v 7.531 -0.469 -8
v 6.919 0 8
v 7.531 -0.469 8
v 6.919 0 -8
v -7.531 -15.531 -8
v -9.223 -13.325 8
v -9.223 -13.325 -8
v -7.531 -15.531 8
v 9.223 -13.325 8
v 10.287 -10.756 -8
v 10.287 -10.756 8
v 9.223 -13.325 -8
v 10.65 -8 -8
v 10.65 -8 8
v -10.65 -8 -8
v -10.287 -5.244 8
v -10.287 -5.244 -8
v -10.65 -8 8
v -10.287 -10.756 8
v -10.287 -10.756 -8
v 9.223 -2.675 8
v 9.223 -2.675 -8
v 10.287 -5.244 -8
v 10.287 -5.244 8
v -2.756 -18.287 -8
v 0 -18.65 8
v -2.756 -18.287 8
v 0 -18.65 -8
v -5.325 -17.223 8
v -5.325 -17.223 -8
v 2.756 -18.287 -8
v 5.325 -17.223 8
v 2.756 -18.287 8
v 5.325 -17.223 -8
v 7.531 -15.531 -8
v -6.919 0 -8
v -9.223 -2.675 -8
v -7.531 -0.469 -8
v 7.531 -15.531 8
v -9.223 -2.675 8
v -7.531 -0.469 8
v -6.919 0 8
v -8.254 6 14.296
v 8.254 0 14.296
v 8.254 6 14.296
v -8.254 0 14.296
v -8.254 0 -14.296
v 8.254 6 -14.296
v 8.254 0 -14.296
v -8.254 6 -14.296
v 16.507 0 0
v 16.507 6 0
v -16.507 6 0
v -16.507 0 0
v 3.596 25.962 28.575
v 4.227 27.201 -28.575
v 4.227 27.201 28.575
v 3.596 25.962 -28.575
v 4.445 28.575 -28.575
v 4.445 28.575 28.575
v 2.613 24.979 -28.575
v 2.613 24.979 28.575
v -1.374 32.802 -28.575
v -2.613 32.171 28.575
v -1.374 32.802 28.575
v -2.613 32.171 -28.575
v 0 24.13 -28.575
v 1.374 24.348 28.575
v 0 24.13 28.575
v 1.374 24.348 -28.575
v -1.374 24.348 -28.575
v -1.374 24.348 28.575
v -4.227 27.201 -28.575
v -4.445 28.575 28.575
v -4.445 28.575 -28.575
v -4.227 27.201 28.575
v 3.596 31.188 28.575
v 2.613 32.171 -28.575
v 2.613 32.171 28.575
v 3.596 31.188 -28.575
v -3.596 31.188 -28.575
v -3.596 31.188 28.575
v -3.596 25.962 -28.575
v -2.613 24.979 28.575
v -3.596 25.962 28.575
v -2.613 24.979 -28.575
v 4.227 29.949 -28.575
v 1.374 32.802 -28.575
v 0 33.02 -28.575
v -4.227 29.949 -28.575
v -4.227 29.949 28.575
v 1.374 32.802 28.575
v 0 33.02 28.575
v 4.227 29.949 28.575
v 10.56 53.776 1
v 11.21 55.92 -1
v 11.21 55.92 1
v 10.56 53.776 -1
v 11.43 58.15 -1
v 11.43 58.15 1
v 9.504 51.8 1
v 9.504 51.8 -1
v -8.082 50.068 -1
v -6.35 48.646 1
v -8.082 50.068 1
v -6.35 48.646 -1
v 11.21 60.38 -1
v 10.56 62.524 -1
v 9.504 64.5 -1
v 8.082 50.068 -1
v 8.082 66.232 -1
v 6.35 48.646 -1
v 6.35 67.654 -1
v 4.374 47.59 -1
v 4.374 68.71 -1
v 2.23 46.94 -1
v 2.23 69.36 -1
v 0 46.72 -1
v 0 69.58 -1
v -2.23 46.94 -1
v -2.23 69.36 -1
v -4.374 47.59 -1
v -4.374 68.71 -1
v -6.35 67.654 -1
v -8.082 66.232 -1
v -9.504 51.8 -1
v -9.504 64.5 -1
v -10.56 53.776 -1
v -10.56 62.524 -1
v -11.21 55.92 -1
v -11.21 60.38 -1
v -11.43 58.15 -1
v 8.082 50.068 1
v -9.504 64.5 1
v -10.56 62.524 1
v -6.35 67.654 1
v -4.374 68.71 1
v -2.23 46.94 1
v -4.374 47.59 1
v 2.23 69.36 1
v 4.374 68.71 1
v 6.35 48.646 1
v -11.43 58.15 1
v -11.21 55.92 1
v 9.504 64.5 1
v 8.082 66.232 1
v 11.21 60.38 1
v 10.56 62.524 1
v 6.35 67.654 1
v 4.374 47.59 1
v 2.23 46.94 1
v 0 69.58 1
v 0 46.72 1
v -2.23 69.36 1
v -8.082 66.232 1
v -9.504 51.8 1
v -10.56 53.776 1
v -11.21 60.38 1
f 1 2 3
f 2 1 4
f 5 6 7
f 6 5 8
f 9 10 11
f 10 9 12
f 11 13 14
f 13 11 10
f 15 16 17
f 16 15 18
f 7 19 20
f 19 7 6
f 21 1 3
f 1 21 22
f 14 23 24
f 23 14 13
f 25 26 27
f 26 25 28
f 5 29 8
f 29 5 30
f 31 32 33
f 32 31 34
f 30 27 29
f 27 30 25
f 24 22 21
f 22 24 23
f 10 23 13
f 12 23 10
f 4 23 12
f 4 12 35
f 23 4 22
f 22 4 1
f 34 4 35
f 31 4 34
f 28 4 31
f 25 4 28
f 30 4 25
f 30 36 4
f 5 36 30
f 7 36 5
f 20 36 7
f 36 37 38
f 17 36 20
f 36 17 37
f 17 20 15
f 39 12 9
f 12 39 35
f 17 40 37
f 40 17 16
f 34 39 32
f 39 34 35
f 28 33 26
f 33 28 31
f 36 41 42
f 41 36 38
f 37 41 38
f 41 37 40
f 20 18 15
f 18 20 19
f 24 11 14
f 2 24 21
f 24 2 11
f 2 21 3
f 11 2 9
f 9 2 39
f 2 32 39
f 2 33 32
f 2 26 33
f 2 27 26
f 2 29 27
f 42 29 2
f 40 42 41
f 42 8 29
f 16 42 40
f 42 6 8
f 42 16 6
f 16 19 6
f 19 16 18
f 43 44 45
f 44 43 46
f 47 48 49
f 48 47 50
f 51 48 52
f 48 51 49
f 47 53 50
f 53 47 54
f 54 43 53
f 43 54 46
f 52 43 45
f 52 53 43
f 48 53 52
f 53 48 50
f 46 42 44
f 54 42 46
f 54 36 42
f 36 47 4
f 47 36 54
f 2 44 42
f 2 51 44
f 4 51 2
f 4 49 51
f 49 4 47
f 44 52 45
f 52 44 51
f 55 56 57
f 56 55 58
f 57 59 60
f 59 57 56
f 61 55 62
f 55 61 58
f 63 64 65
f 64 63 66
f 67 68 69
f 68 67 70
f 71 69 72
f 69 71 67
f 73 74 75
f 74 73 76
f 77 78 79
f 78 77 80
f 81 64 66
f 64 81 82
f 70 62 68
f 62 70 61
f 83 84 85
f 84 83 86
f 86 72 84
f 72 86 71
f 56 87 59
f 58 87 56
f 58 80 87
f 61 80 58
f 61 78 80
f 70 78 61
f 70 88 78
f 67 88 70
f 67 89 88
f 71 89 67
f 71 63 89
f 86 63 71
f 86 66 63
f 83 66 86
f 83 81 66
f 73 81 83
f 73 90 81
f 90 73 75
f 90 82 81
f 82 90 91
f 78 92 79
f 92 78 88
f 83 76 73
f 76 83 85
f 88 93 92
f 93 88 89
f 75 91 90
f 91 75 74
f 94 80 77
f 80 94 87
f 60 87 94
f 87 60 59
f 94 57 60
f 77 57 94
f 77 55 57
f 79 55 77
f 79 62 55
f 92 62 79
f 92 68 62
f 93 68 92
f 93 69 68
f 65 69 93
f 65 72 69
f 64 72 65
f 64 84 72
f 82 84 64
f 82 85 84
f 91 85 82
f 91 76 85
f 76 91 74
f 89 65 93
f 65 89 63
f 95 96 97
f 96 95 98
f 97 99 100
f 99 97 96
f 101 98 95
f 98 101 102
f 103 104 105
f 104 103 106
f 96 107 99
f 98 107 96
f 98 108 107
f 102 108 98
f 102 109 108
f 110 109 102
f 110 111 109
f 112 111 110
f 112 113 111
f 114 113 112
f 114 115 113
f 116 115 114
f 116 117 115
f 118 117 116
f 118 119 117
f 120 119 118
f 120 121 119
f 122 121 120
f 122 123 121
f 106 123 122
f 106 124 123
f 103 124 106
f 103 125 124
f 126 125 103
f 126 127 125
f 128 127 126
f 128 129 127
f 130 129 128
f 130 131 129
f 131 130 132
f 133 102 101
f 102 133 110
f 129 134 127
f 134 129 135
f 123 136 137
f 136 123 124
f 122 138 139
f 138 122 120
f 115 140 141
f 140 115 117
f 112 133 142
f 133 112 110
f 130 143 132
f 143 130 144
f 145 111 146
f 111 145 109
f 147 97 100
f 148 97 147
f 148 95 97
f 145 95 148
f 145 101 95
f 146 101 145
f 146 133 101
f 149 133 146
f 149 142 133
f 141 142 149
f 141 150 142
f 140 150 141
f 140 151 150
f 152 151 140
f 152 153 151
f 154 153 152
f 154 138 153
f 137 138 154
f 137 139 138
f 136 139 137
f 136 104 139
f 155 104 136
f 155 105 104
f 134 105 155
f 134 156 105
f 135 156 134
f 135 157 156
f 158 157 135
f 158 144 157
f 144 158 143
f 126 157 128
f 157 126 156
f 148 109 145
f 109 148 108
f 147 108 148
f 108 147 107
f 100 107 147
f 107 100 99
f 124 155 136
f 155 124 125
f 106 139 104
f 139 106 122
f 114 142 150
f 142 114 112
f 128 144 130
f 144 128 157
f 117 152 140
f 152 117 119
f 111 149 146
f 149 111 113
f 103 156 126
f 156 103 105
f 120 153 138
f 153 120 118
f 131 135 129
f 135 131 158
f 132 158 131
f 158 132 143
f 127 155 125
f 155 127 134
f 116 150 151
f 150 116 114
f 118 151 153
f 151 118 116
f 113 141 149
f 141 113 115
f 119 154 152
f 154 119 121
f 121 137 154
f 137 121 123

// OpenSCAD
// Auto-generated by scripts/author_from_manifest.py (Phase D.3).
// Source: data/phase_d_manifest.json (sku_intent='tyco-ty3151-upright-175f').
// Do not hand-edit — regenerate from the manifest.
//
// @part tyco_ty3151_upright_175f
// @kind sprinkler_head
// @category head.upright.k56
// @display-name "Tyco TY3151 Upright K5.6 SR 175°F"
// @mfg tyco_fire_protection
// @mfg-pn TY3151
// @listing UL FM
// @hazard-classes LH OH1
// @price-usd 13.80
// @install-minutes 8
// @crew journeyman
// @k-factor 5.6
// @orientation upright
// @response standard
// @temperature 175F
// @param size_in number default=0.5 label="Size" unit="in"
// @port inlet position=[0,0.014,0] direction=[0,1,0] style=NPT_threaded size_in=0.5 role=drop

size_in = 0.5;
k_factor = 5.6;

length_mm   = 57.15;
body_dia_mm = 25.40;
thread_od   = 21.3;
thread_len  = 16;
deflector_d = body_dia_mm * 0.9;

rotate([180,0,0]) union() {
    translate([0, thread_len/2, 0])
        cylinder(h = thread_len, d = thread_od, center = true, $fn = 24);
    translate([0, -3, 0])
        rotate([90, 0, 0])
        cylinder(h = 6, d = thread_od * 1.55, $fn = 6, center = true);
    translate([0, -length_mm/2, 0])
        cylinder(h = length_mm, d = body_dia_mm * 0.35, center = true, $fn = 20);
    translate([0, -length_mm - 1, 0])
        cylinder(h = 2, d = deflector_d, center = true, $fn = 32);
}
